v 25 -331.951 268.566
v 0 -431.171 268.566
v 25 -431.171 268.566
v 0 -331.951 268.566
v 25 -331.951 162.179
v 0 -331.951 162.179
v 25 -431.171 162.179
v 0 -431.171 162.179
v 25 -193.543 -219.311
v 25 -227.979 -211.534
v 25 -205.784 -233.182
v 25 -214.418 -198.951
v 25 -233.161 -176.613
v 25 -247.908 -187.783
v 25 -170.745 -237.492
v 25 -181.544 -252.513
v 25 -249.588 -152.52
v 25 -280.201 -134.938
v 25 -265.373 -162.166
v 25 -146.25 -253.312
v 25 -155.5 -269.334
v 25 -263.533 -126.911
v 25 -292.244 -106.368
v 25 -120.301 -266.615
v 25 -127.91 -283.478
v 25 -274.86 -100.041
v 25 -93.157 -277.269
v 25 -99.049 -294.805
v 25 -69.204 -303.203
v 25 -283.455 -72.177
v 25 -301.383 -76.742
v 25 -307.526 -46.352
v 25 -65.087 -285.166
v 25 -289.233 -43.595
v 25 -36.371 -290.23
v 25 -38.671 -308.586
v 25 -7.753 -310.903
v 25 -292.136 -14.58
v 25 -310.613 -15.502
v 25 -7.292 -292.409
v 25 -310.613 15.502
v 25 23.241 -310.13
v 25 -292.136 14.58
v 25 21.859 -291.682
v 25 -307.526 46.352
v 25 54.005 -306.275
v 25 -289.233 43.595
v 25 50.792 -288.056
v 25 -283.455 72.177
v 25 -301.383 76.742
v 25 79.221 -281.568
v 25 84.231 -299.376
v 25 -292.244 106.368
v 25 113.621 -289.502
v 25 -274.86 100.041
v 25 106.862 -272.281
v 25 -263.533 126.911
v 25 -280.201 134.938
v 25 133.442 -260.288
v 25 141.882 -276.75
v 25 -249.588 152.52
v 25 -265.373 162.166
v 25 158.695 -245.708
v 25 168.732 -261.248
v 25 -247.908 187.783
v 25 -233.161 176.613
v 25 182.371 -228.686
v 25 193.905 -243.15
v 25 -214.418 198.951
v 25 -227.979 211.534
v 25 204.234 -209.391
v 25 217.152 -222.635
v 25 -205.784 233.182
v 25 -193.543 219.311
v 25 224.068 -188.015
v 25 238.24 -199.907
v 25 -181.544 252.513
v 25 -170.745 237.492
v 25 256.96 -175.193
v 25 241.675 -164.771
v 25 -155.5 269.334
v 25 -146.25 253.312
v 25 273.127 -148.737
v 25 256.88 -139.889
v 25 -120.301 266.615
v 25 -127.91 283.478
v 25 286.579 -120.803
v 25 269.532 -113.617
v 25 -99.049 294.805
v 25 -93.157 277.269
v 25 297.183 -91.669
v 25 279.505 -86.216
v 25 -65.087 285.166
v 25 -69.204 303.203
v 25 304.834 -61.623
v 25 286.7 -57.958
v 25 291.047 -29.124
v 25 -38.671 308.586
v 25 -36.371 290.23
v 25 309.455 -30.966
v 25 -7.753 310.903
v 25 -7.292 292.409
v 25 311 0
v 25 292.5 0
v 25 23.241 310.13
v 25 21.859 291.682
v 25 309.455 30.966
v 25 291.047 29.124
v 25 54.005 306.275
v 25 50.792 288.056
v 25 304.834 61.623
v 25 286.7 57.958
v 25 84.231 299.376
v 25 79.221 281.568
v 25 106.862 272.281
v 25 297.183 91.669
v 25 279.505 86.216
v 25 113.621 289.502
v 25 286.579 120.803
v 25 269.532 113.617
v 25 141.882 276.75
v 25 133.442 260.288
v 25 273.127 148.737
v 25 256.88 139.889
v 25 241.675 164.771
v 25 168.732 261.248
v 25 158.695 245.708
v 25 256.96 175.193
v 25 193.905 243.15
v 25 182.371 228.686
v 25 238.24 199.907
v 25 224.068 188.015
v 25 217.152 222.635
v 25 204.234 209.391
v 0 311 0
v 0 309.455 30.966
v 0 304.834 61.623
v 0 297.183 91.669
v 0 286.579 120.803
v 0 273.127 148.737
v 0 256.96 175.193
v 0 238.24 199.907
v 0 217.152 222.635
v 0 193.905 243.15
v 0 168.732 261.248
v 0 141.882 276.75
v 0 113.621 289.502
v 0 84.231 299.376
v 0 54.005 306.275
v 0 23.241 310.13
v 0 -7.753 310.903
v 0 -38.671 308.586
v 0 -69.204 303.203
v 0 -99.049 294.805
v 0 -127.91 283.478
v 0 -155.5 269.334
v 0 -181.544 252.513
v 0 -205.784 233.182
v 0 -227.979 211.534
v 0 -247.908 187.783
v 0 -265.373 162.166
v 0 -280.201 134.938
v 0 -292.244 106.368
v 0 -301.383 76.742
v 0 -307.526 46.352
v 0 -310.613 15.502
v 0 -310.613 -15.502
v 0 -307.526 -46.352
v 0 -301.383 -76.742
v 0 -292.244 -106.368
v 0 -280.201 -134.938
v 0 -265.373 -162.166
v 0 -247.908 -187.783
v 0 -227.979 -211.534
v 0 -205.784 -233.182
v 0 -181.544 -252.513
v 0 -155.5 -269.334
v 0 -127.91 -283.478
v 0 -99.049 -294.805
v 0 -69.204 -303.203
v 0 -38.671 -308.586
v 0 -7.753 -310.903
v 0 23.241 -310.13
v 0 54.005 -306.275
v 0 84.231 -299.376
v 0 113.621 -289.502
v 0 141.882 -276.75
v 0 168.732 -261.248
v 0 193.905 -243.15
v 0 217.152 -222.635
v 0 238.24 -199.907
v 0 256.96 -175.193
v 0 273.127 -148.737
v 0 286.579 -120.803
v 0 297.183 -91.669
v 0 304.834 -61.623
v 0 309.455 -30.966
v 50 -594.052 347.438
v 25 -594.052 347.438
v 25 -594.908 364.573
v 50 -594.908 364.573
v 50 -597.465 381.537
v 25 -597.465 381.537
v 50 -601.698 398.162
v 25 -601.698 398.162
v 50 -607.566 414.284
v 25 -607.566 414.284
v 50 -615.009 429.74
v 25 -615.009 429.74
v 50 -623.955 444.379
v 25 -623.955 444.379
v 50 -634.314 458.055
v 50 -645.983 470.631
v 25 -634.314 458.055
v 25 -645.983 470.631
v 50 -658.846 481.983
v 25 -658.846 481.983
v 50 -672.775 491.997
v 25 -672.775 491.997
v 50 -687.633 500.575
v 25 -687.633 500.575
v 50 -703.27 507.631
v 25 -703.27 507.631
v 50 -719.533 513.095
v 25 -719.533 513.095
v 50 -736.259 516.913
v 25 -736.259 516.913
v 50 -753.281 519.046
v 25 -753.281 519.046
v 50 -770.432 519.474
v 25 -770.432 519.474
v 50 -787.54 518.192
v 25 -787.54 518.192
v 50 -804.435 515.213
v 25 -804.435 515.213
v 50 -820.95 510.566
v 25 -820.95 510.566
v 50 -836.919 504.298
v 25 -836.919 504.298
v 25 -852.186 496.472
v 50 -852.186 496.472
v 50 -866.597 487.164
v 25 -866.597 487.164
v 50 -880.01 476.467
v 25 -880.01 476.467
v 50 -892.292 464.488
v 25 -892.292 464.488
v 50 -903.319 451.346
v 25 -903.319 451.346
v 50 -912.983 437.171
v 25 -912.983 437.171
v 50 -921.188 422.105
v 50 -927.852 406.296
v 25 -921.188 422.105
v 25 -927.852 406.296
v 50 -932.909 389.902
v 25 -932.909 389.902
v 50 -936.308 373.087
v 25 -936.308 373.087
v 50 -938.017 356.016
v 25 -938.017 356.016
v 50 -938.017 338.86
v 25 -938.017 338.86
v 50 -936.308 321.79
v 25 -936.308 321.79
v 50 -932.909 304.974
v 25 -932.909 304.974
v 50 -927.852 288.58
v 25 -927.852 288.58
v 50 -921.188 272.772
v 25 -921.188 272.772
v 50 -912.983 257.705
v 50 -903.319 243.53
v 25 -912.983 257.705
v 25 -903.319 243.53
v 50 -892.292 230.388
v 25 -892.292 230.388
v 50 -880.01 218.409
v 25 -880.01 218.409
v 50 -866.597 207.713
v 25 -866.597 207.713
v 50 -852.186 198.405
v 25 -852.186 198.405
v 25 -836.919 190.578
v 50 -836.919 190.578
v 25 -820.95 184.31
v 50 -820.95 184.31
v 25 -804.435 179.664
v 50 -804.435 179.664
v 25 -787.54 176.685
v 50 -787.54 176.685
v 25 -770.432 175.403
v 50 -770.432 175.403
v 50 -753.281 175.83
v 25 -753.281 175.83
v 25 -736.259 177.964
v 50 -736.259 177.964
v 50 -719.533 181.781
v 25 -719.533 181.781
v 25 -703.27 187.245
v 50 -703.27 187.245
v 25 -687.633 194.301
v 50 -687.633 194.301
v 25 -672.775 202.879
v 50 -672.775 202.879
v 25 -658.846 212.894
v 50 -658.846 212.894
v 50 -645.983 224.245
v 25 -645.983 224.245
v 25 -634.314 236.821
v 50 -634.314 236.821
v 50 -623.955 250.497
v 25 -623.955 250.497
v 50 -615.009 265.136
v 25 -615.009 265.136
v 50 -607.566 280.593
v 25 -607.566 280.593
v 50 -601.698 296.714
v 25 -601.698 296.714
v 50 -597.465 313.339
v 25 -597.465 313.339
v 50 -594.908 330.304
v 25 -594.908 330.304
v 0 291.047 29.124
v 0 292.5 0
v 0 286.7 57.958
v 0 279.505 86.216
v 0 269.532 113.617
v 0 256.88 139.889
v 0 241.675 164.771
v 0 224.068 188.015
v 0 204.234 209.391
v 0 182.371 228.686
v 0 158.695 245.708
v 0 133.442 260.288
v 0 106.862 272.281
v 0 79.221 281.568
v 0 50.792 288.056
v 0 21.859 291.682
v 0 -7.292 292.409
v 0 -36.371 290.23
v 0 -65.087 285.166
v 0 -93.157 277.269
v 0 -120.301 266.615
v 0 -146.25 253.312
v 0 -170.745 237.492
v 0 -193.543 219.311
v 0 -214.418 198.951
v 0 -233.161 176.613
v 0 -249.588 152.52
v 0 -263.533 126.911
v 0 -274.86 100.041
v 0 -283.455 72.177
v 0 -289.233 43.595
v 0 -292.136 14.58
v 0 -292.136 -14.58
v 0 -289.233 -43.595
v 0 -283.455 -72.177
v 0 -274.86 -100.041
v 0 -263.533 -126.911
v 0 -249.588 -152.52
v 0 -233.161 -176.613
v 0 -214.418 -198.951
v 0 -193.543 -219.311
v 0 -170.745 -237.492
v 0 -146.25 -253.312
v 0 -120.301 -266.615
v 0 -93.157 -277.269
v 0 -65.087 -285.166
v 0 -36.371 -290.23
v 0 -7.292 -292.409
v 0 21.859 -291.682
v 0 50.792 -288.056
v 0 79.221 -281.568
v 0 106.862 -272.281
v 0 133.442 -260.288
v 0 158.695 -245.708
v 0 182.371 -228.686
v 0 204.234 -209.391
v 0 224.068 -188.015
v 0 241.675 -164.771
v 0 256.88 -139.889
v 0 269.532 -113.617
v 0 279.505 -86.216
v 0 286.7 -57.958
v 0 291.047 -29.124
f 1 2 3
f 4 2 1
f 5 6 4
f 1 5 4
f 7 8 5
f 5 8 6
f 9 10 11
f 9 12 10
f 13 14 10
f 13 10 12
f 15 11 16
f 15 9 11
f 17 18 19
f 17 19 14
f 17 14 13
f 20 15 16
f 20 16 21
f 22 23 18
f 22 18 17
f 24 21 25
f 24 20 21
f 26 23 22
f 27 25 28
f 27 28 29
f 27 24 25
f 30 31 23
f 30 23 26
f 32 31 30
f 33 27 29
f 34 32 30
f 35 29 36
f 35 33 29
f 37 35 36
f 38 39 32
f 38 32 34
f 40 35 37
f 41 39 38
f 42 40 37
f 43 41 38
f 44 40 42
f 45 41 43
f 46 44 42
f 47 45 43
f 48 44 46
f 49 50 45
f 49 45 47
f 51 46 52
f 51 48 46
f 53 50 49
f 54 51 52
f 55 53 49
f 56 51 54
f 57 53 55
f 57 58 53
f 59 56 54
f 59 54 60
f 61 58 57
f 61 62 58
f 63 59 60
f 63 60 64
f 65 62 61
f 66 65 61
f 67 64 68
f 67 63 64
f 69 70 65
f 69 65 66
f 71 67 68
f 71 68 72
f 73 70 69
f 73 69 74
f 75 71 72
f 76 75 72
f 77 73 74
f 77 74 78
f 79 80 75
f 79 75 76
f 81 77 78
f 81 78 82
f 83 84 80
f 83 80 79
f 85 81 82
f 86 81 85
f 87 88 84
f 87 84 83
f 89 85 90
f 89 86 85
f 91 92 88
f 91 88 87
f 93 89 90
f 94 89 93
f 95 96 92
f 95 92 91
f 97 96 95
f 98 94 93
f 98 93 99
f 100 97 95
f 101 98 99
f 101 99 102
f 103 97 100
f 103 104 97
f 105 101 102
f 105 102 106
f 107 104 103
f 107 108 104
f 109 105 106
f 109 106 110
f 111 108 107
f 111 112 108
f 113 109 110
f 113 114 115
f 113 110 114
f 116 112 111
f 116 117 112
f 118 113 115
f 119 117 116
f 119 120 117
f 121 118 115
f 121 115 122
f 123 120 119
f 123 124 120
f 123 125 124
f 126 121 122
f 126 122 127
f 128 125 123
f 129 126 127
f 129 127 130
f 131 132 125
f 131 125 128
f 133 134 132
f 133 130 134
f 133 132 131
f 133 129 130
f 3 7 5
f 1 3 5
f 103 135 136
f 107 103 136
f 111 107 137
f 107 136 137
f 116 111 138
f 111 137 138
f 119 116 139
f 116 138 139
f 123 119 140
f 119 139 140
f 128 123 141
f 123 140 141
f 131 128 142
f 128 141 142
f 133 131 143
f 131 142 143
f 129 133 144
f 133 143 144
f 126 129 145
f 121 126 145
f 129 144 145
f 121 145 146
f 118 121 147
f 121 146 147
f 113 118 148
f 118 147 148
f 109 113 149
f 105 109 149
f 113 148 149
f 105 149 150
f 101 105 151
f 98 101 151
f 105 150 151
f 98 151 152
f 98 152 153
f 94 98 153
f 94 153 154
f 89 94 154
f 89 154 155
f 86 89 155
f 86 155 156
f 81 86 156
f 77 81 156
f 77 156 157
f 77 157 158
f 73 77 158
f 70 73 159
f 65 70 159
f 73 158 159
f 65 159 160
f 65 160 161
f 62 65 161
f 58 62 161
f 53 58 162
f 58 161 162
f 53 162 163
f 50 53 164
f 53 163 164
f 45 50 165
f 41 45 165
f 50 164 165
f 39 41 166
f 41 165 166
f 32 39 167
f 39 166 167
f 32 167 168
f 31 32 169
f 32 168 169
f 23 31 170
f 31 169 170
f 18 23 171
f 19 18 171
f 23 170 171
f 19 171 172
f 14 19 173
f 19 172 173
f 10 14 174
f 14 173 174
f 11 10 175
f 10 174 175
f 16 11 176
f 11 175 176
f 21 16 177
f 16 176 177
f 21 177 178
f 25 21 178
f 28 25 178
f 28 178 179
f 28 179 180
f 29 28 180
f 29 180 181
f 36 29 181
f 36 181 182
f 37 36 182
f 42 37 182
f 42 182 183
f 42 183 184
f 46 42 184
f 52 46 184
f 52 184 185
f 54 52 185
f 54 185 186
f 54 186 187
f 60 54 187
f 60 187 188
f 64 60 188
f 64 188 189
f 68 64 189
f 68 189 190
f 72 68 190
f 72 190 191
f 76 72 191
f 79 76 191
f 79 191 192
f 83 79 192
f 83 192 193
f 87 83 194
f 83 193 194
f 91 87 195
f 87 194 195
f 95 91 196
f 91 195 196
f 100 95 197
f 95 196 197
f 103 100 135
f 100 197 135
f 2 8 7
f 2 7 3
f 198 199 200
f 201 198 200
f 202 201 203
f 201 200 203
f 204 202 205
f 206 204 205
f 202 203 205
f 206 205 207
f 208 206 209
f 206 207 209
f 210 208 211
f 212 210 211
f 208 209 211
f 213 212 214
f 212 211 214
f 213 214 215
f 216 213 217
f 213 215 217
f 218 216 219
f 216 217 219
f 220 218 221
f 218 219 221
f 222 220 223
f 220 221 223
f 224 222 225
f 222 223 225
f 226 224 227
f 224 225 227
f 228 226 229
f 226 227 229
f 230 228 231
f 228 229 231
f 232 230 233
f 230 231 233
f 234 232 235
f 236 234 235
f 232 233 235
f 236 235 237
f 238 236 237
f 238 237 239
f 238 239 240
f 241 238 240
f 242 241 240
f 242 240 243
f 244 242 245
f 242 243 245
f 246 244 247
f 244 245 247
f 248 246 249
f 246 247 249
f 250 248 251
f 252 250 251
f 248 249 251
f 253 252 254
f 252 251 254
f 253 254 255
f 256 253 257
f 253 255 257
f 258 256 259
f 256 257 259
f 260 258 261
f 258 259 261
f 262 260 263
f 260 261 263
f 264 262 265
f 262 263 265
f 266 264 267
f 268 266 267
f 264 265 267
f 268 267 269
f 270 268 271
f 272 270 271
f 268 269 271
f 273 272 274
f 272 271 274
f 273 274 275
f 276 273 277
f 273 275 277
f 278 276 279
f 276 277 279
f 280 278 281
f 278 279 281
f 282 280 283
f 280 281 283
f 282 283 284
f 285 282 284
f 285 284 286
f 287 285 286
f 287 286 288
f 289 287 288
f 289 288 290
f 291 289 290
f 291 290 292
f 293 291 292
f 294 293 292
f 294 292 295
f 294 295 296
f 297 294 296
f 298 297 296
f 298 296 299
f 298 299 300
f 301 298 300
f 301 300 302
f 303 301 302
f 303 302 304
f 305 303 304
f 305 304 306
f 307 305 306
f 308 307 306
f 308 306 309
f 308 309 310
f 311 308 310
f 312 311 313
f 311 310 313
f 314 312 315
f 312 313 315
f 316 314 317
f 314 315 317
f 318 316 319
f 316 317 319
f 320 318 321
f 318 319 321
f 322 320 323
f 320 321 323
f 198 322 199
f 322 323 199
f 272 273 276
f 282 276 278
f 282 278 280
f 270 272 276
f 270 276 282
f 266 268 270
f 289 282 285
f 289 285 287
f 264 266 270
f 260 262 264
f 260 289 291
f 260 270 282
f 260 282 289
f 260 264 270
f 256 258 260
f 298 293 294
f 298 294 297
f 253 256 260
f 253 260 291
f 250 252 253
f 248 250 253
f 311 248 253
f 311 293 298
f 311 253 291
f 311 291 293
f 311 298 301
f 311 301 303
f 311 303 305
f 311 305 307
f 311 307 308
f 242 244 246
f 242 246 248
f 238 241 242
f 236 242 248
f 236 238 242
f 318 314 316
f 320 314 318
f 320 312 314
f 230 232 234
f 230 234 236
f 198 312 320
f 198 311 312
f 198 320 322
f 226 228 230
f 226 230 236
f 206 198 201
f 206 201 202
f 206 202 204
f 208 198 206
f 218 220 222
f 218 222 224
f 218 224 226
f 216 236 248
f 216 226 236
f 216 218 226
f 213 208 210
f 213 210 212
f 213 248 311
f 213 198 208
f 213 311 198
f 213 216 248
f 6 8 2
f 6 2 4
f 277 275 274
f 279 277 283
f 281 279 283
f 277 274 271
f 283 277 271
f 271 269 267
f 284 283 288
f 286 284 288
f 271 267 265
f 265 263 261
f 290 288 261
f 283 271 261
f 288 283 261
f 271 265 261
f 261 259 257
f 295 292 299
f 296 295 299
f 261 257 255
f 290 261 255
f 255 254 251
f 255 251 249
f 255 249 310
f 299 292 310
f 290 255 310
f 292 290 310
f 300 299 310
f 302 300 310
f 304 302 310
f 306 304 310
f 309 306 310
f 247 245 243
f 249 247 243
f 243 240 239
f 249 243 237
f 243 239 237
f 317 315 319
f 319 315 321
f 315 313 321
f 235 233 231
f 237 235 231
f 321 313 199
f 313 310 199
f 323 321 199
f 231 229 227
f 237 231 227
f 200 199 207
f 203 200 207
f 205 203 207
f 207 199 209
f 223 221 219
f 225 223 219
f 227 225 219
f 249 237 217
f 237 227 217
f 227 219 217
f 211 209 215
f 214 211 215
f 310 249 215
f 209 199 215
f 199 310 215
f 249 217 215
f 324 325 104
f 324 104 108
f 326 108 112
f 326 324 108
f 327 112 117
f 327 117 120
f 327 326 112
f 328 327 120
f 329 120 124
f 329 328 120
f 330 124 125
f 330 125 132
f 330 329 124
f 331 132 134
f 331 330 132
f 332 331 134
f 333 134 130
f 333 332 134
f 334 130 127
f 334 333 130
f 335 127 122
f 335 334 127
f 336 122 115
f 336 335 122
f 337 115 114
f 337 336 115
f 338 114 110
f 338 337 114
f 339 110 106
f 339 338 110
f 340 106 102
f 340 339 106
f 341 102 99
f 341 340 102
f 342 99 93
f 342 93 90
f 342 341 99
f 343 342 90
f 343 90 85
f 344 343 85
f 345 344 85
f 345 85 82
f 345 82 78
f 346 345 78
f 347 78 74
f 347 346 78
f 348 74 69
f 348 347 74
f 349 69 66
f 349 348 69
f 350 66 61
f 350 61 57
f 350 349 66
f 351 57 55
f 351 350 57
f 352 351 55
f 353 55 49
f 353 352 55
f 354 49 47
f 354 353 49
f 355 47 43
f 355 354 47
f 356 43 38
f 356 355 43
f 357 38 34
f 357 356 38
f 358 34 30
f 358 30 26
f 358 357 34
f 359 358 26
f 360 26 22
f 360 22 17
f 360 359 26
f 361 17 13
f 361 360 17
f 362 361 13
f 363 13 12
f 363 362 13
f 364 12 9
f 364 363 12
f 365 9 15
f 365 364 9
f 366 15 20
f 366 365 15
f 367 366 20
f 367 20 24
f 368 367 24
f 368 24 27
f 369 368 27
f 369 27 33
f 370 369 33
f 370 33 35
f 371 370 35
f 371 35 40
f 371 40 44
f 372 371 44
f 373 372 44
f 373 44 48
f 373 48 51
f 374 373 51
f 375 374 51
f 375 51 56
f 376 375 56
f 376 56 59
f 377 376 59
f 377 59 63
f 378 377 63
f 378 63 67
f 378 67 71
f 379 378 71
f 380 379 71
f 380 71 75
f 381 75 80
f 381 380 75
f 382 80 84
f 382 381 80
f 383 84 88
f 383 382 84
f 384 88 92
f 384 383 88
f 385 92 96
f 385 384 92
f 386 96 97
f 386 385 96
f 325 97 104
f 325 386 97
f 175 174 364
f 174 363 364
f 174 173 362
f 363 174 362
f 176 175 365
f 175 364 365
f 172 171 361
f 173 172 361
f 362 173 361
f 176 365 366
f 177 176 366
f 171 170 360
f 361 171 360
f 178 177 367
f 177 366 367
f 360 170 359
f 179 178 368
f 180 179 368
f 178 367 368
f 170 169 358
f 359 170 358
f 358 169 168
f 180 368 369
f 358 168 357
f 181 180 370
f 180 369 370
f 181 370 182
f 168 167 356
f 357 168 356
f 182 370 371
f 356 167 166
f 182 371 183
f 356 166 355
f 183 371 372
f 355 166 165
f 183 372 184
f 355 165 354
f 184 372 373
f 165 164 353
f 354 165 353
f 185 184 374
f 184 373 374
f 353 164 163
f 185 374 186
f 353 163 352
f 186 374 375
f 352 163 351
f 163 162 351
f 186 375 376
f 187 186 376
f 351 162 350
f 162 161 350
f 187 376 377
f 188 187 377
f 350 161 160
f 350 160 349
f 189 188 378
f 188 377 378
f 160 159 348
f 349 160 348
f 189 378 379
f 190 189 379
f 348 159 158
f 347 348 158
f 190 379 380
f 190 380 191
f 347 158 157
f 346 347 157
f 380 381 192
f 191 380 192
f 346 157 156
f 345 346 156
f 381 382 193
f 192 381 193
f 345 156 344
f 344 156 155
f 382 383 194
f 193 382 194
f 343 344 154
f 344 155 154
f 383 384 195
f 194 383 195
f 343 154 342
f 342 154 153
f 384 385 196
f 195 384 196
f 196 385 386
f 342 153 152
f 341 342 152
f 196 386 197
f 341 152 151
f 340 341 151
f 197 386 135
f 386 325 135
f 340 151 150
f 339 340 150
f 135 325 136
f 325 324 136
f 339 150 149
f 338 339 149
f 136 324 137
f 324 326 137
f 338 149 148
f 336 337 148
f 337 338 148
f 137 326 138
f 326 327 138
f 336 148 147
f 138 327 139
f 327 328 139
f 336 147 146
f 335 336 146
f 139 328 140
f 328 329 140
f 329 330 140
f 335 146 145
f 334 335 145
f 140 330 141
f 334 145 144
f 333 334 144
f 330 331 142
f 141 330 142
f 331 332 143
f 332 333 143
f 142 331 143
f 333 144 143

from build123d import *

# Parameters (mm, degrees)
F1_R     = 311
F1_R_2   = 292.5
F3_DEPTH = 25
F5_W     = 99.2197990417
F5_H     = 106.3870340586
F6_DEPTH = 25
F7_R     = 172.0890507053
F8_DEPTH = 25


# Not quite as in the source:
# - the program builds the solid bodies; features that only make, move or delete a surface that nothing else refers to are left out


with BuildPart() as f3:
    # F1 (on face) → F3 (new body)
    with BuildSketch(Plane.YZ):
        Circle(F1_R)
        Circle(F1_R_2, mode=Mode.SUBTRACT)
    extrude(amount=F3_DEPTH)


with BuildPart() as f6:
    # F5 (on Right) → F6 (new body)
    with BuildSketch(Plane.YZ):
        with Locations((-381.5611600876, 215.3727337718)):
            Rectangle(F5_W, F5_H)
    extrude(amount=F6_DEPTH)


with BuildPart() as f8:
    # F7 (on face) → F8 (new body)
    with BuildSketch(Plane.YZ.offset(25)):
        with Locations((-766.141474247, 347.4381864071)):
            Circle(F7_R)
    extrude(amount=F8_DEPTH)


solid = Compound([f3.part, f6.part, f8.part])
